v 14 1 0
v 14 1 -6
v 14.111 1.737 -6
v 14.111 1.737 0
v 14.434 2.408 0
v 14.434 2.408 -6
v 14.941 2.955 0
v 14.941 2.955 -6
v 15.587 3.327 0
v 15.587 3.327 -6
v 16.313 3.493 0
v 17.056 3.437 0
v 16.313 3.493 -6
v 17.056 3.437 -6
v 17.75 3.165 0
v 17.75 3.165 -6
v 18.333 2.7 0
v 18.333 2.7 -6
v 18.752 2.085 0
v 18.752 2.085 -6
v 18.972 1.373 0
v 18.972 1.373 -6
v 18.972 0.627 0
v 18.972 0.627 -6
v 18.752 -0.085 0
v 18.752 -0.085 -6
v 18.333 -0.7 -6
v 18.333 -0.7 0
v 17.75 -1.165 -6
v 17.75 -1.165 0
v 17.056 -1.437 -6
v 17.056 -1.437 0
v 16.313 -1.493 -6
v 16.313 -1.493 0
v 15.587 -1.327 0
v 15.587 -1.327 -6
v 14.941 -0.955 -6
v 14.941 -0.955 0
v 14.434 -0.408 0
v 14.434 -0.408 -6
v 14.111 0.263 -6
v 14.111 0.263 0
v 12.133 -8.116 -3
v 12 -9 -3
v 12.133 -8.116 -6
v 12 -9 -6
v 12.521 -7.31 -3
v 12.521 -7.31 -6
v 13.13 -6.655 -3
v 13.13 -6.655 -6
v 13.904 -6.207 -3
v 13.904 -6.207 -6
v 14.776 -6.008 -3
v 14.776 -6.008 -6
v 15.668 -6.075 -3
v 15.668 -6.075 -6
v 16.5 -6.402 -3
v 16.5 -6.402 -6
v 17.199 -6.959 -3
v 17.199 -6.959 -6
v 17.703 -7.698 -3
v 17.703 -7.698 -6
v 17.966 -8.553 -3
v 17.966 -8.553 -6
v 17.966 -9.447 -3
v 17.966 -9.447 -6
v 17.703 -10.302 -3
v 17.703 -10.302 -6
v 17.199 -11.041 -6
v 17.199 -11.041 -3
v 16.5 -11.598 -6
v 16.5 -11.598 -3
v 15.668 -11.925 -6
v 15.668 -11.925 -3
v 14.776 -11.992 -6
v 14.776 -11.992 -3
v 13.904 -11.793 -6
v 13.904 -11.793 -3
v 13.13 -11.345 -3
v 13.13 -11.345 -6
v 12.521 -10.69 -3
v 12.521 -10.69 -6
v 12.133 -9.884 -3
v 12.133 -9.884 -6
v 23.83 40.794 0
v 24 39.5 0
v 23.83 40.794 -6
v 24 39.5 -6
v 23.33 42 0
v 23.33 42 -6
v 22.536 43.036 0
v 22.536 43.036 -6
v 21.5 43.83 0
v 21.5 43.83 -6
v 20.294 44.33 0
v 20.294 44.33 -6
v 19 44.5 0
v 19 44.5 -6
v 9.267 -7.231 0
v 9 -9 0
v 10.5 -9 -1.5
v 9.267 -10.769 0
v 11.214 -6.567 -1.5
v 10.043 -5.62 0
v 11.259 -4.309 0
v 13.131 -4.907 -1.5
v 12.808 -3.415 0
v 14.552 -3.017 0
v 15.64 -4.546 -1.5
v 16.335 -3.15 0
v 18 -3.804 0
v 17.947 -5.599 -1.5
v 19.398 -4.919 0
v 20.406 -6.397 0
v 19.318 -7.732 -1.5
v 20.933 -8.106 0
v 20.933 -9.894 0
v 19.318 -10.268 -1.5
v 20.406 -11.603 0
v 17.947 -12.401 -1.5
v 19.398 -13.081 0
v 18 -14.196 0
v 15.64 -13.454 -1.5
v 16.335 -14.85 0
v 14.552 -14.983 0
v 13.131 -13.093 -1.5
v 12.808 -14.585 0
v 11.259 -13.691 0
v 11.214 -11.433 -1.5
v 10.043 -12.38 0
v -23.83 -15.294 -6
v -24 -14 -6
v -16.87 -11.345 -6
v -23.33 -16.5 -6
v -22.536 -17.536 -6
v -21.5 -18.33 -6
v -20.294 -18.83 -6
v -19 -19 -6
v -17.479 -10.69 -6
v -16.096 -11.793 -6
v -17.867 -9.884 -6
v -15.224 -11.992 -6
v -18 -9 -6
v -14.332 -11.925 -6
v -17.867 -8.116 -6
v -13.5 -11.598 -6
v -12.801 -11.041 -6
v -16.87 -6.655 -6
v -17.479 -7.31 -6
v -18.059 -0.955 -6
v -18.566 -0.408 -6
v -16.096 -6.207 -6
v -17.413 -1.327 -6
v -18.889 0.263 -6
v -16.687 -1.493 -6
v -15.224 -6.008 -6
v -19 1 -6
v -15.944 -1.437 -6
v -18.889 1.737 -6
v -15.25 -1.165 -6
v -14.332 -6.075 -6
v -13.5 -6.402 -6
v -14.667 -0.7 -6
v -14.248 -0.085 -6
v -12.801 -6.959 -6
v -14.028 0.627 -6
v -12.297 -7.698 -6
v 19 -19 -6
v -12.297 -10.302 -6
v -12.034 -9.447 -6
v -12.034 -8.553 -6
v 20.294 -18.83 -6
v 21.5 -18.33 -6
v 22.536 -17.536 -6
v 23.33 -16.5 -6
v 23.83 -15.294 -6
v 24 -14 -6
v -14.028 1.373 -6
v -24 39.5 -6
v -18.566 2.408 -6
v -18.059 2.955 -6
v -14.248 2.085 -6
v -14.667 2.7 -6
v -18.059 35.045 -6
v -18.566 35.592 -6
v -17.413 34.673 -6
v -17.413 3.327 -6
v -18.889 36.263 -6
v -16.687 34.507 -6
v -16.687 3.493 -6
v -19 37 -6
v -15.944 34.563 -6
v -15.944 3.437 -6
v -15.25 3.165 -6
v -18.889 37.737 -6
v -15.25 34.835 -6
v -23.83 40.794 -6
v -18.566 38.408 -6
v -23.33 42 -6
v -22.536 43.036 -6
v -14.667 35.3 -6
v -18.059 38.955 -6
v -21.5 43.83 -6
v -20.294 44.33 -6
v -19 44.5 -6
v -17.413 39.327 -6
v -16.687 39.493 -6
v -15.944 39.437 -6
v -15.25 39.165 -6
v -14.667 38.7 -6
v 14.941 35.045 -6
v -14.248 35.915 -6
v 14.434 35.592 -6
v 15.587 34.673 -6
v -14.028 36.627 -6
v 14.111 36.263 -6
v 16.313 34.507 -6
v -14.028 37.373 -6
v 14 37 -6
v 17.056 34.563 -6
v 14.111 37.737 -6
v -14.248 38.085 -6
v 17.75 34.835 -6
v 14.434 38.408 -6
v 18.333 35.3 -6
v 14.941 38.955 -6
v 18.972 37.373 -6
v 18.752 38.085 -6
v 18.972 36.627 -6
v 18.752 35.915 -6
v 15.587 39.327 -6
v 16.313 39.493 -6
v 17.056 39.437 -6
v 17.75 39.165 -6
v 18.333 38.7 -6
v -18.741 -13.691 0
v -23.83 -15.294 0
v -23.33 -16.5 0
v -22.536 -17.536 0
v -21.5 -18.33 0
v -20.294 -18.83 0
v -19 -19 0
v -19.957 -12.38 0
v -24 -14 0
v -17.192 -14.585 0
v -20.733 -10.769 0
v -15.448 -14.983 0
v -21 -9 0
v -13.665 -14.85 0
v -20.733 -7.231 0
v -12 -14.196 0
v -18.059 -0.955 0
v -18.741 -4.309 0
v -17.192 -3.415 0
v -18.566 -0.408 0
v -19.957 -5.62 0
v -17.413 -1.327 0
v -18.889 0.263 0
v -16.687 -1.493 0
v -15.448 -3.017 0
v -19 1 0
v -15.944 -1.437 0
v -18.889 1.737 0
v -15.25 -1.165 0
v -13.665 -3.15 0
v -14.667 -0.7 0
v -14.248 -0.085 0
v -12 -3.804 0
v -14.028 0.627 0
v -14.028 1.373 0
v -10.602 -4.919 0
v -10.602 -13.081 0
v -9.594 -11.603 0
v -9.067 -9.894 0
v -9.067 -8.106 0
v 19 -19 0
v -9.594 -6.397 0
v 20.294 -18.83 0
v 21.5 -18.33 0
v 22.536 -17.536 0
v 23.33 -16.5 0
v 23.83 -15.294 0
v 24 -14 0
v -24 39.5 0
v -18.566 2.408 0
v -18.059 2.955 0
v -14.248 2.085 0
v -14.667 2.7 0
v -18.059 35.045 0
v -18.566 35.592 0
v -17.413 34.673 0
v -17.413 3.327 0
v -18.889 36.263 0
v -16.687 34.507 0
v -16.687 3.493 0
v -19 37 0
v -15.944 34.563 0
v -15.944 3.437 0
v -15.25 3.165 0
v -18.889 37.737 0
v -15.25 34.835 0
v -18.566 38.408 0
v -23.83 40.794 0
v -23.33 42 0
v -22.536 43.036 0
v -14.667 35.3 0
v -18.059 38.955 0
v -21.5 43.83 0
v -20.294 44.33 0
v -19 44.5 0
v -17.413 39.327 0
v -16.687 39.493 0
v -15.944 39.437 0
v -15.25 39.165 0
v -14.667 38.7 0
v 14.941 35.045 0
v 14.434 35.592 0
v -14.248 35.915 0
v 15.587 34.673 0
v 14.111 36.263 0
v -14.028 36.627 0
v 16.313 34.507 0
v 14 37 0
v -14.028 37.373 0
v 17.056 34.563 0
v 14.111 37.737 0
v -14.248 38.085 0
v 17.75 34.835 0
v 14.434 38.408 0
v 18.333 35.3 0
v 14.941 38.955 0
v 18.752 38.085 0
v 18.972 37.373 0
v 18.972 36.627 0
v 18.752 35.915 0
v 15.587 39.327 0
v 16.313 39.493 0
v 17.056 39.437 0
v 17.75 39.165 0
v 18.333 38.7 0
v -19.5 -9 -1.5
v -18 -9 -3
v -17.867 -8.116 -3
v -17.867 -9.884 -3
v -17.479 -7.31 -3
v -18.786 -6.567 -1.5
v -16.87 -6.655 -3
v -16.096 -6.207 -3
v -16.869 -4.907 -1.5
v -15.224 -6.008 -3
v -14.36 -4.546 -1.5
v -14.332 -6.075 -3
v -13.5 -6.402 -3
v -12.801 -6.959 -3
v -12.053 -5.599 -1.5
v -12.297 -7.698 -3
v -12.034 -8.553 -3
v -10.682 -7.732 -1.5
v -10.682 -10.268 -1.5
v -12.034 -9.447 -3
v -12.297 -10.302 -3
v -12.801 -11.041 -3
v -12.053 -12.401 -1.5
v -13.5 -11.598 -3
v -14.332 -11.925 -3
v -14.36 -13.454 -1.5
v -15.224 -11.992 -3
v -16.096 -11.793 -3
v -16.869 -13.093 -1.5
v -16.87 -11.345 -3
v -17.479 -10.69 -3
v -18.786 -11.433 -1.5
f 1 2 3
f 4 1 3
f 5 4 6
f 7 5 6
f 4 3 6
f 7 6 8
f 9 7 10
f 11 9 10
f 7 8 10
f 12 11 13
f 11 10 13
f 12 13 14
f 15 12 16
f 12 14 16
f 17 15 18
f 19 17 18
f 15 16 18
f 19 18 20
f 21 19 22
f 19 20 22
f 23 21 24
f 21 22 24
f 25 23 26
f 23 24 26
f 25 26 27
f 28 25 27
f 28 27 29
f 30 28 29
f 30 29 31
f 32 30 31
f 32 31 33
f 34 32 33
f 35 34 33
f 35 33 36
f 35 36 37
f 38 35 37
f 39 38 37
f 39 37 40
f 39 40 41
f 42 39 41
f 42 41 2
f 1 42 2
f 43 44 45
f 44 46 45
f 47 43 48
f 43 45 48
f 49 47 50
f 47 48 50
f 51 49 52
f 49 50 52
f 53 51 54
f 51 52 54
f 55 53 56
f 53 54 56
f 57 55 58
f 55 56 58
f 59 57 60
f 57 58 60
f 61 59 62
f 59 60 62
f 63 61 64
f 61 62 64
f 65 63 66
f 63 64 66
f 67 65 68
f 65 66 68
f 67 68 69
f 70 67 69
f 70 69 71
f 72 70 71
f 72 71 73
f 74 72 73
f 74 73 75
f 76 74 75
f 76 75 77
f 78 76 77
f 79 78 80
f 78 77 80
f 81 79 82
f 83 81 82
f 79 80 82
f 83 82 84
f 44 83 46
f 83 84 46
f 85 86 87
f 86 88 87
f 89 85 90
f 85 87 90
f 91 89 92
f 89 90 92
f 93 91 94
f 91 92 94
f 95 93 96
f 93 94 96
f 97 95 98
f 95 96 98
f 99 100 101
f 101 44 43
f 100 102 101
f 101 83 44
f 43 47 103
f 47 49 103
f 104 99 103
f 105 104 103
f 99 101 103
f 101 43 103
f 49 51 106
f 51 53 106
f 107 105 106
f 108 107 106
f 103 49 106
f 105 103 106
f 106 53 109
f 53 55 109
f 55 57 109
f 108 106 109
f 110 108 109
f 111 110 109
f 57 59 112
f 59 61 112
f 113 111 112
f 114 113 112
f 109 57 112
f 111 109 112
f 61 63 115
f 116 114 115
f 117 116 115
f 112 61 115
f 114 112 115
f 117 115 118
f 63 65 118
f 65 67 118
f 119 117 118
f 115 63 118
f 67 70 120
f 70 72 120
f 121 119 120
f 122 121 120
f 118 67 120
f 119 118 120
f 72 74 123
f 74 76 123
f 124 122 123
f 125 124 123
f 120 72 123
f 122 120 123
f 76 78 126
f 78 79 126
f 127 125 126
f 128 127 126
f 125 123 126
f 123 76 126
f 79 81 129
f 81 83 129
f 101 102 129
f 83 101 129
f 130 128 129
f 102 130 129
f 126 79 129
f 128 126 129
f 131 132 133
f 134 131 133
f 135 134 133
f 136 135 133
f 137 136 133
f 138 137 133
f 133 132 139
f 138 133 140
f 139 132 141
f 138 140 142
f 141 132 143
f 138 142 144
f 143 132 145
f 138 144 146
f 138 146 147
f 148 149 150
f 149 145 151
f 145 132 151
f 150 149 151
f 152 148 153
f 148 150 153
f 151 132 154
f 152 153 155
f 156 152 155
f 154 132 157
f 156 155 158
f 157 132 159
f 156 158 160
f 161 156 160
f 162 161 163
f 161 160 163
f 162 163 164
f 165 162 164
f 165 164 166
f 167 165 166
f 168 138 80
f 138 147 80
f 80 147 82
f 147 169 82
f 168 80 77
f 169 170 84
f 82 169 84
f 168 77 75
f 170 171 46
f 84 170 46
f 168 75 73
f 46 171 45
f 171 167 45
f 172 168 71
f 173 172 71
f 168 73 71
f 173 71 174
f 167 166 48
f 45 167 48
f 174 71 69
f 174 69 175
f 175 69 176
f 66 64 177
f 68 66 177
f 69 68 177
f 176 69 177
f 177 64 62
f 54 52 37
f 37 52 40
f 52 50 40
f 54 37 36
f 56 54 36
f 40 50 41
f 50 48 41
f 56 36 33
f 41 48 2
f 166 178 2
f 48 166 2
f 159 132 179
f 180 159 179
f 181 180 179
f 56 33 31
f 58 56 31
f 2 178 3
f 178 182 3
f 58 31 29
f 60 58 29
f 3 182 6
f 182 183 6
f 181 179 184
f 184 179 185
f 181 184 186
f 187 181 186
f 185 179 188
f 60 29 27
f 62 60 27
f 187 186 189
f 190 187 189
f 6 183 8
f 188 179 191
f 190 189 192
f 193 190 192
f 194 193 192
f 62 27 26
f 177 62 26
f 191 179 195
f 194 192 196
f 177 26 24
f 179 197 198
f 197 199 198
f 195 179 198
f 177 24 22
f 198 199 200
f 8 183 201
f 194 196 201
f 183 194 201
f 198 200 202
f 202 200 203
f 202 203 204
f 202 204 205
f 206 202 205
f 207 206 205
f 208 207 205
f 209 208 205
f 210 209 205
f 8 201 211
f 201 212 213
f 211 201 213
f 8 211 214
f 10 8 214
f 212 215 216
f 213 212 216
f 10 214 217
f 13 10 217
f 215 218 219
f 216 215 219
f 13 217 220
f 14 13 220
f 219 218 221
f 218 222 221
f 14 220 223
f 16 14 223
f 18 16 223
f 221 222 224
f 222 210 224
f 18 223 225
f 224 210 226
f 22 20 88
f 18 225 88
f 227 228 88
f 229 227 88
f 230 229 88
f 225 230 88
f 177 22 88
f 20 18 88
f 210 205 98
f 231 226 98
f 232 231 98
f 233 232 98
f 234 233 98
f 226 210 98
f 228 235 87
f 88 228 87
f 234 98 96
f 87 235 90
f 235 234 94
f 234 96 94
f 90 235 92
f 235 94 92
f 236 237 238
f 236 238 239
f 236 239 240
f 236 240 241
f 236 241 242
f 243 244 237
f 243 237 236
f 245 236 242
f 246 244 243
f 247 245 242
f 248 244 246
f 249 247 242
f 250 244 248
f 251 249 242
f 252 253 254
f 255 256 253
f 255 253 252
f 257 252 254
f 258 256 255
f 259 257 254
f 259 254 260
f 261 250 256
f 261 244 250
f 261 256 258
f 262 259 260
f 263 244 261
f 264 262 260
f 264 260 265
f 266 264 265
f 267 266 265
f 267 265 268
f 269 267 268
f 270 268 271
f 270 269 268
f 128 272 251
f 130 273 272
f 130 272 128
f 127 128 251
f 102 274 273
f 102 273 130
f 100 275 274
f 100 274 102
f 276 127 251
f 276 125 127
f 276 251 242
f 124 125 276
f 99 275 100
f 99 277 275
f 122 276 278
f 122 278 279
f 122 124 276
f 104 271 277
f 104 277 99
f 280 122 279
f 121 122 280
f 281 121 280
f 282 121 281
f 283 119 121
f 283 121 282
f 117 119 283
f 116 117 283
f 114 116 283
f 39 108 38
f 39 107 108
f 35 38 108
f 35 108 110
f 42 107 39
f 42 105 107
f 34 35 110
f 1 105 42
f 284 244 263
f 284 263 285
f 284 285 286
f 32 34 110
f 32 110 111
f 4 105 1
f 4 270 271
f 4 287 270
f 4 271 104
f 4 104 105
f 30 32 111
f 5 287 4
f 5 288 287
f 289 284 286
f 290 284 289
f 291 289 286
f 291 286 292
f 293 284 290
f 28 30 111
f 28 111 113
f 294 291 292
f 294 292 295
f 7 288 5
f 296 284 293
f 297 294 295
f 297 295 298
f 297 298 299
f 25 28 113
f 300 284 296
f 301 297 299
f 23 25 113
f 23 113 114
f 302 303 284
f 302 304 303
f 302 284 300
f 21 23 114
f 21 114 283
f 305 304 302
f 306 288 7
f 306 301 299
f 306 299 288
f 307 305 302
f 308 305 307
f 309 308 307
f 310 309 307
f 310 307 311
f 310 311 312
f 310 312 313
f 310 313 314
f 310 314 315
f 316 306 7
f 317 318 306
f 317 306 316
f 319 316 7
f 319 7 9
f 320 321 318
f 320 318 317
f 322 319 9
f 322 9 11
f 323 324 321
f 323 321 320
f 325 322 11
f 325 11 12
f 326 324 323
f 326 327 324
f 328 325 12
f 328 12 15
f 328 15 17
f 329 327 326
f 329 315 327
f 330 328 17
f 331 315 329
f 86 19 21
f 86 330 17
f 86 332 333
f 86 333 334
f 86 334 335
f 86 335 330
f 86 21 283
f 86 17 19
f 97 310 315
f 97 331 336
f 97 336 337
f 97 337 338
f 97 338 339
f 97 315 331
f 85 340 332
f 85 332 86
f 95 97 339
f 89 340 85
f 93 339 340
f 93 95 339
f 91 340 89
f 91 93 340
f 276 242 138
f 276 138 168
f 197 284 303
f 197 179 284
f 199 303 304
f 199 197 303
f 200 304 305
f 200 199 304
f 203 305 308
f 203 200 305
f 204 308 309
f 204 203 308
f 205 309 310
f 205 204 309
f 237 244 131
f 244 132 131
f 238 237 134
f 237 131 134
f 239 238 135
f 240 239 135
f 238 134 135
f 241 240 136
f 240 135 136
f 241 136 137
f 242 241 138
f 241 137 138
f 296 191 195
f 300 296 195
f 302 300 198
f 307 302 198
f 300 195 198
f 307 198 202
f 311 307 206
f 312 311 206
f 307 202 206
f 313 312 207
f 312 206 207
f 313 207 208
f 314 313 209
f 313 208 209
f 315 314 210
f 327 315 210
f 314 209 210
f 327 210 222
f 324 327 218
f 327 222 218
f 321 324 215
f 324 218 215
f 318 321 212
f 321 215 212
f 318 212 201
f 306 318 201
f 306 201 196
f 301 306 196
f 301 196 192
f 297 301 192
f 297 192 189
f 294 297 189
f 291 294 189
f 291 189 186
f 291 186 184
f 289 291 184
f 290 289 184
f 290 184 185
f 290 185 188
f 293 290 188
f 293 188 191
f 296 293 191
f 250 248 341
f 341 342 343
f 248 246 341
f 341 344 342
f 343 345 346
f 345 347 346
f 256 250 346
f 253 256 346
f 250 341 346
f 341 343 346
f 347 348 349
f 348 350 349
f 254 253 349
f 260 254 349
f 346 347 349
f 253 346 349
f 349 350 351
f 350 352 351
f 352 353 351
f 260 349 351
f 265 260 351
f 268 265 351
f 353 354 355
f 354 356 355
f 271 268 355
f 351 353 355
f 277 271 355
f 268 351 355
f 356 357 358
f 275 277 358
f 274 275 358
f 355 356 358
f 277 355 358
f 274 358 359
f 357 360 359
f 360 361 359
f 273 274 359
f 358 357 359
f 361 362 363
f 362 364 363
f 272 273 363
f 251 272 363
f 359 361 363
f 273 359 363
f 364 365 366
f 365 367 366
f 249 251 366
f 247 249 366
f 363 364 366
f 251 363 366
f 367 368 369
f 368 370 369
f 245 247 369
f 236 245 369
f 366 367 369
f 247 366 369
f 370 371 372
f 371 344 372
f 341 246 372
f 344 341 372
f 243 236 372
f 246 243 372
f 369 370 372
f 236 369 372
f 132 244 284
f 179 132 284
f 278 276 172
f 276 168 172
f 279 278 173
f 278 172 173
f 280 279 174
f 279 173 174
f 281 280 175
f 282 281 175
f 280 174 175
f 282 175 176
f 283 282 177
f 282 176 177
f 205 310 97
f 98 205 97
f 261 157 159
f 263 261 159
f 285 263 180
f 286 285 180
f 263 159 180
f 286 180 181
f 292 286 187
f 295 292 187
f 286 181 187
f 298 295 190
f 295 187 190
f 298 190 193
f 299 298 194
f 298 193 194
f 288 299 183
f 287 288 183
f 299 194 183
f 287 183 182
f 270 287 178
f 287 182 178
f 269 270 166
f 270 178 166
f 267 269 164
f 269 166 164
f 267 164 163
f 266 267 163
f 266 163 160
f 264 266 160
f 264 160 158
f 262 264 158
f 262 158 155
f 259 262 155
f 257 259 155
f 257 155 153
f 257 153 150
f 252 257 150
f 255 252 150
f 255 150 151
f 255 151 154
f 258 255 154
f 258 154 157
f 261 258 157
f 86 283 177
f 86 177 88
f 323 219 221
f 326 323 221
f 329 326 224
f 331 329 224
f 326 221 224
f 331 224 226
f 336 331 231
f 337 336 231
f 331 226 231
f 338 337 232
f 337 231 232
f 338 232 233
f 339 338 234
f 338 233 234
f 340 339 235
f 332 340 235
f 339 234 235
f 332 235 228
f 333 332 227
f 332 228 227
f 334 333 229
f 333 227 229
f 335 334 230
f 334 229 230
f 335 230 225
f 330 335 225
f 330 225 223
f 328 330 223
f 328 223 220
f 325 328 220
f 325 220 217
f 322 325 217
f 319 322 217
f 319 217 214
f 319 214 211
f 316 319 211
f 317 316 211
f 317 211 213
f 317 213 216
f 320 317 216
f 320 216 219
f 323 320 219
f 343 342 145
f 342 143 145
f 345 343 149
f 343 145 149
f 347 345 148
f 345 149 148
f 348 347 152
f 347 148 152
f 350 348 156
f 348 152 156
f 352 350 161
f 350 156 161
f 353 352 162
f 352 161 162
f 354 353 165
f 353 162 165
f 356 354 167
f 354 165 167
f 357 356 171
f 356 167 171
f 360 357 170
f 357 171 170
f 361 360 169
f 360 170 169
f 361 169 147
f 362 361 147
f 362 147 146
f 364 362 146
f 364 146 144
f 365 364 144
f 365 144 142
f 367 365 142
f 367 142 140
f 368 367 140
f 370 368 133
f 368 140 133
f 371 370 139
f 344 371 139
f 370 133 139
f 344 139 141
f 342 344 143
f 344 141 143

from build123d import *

# Parameters (mm, degrees)
F0_W           = 48
F0_H           = 63.5
F1_DEPTH       = 6
F2_R           = 5
F3_D           = 5
F4_D           = 6
F4_CSINK_D     = 12
F4_CSINK_ANGLE = 90


# Not quite as in the source:
# - a feature names something its author has since deleted; it is built from what else it names


with BuildPart() as f1:
    # F0 (on Top) → F1 (new body)
    with BuildSketch(Plane.XY):
        with Locations((0, 12.75)):
            Rectangle(F0_W, F0_H)
    extrude(amount=-F1_DEPTH)

    # F2
    f2_edges = [f1.edges().sort_by_distance(p)[0] for p in [
        (-24, -19, -3),
        (-24, 44.5, -3),
        (24, -19, -3),
        (24, 44.5, -3),
    ]]
    fillet(f2_edges, radius=F2_R)

    # F3 (through all)
    with Locations(Plane.XY):
        with Locations((16.5, 1), (-16.5, 1), (16.5, 37), (-16.5, 37)):
            Hole(F3_D / 2)

    # F4 (through all)
    with Locations(Plane.XY):
        with Locations((15, -9), (-15, -9)):
            CounterSinkHole(F4_D / 2, F4_CSINK_D / 2, counter_sink_angle=F4_CSINK_ANGLE)


solid = f1.part
